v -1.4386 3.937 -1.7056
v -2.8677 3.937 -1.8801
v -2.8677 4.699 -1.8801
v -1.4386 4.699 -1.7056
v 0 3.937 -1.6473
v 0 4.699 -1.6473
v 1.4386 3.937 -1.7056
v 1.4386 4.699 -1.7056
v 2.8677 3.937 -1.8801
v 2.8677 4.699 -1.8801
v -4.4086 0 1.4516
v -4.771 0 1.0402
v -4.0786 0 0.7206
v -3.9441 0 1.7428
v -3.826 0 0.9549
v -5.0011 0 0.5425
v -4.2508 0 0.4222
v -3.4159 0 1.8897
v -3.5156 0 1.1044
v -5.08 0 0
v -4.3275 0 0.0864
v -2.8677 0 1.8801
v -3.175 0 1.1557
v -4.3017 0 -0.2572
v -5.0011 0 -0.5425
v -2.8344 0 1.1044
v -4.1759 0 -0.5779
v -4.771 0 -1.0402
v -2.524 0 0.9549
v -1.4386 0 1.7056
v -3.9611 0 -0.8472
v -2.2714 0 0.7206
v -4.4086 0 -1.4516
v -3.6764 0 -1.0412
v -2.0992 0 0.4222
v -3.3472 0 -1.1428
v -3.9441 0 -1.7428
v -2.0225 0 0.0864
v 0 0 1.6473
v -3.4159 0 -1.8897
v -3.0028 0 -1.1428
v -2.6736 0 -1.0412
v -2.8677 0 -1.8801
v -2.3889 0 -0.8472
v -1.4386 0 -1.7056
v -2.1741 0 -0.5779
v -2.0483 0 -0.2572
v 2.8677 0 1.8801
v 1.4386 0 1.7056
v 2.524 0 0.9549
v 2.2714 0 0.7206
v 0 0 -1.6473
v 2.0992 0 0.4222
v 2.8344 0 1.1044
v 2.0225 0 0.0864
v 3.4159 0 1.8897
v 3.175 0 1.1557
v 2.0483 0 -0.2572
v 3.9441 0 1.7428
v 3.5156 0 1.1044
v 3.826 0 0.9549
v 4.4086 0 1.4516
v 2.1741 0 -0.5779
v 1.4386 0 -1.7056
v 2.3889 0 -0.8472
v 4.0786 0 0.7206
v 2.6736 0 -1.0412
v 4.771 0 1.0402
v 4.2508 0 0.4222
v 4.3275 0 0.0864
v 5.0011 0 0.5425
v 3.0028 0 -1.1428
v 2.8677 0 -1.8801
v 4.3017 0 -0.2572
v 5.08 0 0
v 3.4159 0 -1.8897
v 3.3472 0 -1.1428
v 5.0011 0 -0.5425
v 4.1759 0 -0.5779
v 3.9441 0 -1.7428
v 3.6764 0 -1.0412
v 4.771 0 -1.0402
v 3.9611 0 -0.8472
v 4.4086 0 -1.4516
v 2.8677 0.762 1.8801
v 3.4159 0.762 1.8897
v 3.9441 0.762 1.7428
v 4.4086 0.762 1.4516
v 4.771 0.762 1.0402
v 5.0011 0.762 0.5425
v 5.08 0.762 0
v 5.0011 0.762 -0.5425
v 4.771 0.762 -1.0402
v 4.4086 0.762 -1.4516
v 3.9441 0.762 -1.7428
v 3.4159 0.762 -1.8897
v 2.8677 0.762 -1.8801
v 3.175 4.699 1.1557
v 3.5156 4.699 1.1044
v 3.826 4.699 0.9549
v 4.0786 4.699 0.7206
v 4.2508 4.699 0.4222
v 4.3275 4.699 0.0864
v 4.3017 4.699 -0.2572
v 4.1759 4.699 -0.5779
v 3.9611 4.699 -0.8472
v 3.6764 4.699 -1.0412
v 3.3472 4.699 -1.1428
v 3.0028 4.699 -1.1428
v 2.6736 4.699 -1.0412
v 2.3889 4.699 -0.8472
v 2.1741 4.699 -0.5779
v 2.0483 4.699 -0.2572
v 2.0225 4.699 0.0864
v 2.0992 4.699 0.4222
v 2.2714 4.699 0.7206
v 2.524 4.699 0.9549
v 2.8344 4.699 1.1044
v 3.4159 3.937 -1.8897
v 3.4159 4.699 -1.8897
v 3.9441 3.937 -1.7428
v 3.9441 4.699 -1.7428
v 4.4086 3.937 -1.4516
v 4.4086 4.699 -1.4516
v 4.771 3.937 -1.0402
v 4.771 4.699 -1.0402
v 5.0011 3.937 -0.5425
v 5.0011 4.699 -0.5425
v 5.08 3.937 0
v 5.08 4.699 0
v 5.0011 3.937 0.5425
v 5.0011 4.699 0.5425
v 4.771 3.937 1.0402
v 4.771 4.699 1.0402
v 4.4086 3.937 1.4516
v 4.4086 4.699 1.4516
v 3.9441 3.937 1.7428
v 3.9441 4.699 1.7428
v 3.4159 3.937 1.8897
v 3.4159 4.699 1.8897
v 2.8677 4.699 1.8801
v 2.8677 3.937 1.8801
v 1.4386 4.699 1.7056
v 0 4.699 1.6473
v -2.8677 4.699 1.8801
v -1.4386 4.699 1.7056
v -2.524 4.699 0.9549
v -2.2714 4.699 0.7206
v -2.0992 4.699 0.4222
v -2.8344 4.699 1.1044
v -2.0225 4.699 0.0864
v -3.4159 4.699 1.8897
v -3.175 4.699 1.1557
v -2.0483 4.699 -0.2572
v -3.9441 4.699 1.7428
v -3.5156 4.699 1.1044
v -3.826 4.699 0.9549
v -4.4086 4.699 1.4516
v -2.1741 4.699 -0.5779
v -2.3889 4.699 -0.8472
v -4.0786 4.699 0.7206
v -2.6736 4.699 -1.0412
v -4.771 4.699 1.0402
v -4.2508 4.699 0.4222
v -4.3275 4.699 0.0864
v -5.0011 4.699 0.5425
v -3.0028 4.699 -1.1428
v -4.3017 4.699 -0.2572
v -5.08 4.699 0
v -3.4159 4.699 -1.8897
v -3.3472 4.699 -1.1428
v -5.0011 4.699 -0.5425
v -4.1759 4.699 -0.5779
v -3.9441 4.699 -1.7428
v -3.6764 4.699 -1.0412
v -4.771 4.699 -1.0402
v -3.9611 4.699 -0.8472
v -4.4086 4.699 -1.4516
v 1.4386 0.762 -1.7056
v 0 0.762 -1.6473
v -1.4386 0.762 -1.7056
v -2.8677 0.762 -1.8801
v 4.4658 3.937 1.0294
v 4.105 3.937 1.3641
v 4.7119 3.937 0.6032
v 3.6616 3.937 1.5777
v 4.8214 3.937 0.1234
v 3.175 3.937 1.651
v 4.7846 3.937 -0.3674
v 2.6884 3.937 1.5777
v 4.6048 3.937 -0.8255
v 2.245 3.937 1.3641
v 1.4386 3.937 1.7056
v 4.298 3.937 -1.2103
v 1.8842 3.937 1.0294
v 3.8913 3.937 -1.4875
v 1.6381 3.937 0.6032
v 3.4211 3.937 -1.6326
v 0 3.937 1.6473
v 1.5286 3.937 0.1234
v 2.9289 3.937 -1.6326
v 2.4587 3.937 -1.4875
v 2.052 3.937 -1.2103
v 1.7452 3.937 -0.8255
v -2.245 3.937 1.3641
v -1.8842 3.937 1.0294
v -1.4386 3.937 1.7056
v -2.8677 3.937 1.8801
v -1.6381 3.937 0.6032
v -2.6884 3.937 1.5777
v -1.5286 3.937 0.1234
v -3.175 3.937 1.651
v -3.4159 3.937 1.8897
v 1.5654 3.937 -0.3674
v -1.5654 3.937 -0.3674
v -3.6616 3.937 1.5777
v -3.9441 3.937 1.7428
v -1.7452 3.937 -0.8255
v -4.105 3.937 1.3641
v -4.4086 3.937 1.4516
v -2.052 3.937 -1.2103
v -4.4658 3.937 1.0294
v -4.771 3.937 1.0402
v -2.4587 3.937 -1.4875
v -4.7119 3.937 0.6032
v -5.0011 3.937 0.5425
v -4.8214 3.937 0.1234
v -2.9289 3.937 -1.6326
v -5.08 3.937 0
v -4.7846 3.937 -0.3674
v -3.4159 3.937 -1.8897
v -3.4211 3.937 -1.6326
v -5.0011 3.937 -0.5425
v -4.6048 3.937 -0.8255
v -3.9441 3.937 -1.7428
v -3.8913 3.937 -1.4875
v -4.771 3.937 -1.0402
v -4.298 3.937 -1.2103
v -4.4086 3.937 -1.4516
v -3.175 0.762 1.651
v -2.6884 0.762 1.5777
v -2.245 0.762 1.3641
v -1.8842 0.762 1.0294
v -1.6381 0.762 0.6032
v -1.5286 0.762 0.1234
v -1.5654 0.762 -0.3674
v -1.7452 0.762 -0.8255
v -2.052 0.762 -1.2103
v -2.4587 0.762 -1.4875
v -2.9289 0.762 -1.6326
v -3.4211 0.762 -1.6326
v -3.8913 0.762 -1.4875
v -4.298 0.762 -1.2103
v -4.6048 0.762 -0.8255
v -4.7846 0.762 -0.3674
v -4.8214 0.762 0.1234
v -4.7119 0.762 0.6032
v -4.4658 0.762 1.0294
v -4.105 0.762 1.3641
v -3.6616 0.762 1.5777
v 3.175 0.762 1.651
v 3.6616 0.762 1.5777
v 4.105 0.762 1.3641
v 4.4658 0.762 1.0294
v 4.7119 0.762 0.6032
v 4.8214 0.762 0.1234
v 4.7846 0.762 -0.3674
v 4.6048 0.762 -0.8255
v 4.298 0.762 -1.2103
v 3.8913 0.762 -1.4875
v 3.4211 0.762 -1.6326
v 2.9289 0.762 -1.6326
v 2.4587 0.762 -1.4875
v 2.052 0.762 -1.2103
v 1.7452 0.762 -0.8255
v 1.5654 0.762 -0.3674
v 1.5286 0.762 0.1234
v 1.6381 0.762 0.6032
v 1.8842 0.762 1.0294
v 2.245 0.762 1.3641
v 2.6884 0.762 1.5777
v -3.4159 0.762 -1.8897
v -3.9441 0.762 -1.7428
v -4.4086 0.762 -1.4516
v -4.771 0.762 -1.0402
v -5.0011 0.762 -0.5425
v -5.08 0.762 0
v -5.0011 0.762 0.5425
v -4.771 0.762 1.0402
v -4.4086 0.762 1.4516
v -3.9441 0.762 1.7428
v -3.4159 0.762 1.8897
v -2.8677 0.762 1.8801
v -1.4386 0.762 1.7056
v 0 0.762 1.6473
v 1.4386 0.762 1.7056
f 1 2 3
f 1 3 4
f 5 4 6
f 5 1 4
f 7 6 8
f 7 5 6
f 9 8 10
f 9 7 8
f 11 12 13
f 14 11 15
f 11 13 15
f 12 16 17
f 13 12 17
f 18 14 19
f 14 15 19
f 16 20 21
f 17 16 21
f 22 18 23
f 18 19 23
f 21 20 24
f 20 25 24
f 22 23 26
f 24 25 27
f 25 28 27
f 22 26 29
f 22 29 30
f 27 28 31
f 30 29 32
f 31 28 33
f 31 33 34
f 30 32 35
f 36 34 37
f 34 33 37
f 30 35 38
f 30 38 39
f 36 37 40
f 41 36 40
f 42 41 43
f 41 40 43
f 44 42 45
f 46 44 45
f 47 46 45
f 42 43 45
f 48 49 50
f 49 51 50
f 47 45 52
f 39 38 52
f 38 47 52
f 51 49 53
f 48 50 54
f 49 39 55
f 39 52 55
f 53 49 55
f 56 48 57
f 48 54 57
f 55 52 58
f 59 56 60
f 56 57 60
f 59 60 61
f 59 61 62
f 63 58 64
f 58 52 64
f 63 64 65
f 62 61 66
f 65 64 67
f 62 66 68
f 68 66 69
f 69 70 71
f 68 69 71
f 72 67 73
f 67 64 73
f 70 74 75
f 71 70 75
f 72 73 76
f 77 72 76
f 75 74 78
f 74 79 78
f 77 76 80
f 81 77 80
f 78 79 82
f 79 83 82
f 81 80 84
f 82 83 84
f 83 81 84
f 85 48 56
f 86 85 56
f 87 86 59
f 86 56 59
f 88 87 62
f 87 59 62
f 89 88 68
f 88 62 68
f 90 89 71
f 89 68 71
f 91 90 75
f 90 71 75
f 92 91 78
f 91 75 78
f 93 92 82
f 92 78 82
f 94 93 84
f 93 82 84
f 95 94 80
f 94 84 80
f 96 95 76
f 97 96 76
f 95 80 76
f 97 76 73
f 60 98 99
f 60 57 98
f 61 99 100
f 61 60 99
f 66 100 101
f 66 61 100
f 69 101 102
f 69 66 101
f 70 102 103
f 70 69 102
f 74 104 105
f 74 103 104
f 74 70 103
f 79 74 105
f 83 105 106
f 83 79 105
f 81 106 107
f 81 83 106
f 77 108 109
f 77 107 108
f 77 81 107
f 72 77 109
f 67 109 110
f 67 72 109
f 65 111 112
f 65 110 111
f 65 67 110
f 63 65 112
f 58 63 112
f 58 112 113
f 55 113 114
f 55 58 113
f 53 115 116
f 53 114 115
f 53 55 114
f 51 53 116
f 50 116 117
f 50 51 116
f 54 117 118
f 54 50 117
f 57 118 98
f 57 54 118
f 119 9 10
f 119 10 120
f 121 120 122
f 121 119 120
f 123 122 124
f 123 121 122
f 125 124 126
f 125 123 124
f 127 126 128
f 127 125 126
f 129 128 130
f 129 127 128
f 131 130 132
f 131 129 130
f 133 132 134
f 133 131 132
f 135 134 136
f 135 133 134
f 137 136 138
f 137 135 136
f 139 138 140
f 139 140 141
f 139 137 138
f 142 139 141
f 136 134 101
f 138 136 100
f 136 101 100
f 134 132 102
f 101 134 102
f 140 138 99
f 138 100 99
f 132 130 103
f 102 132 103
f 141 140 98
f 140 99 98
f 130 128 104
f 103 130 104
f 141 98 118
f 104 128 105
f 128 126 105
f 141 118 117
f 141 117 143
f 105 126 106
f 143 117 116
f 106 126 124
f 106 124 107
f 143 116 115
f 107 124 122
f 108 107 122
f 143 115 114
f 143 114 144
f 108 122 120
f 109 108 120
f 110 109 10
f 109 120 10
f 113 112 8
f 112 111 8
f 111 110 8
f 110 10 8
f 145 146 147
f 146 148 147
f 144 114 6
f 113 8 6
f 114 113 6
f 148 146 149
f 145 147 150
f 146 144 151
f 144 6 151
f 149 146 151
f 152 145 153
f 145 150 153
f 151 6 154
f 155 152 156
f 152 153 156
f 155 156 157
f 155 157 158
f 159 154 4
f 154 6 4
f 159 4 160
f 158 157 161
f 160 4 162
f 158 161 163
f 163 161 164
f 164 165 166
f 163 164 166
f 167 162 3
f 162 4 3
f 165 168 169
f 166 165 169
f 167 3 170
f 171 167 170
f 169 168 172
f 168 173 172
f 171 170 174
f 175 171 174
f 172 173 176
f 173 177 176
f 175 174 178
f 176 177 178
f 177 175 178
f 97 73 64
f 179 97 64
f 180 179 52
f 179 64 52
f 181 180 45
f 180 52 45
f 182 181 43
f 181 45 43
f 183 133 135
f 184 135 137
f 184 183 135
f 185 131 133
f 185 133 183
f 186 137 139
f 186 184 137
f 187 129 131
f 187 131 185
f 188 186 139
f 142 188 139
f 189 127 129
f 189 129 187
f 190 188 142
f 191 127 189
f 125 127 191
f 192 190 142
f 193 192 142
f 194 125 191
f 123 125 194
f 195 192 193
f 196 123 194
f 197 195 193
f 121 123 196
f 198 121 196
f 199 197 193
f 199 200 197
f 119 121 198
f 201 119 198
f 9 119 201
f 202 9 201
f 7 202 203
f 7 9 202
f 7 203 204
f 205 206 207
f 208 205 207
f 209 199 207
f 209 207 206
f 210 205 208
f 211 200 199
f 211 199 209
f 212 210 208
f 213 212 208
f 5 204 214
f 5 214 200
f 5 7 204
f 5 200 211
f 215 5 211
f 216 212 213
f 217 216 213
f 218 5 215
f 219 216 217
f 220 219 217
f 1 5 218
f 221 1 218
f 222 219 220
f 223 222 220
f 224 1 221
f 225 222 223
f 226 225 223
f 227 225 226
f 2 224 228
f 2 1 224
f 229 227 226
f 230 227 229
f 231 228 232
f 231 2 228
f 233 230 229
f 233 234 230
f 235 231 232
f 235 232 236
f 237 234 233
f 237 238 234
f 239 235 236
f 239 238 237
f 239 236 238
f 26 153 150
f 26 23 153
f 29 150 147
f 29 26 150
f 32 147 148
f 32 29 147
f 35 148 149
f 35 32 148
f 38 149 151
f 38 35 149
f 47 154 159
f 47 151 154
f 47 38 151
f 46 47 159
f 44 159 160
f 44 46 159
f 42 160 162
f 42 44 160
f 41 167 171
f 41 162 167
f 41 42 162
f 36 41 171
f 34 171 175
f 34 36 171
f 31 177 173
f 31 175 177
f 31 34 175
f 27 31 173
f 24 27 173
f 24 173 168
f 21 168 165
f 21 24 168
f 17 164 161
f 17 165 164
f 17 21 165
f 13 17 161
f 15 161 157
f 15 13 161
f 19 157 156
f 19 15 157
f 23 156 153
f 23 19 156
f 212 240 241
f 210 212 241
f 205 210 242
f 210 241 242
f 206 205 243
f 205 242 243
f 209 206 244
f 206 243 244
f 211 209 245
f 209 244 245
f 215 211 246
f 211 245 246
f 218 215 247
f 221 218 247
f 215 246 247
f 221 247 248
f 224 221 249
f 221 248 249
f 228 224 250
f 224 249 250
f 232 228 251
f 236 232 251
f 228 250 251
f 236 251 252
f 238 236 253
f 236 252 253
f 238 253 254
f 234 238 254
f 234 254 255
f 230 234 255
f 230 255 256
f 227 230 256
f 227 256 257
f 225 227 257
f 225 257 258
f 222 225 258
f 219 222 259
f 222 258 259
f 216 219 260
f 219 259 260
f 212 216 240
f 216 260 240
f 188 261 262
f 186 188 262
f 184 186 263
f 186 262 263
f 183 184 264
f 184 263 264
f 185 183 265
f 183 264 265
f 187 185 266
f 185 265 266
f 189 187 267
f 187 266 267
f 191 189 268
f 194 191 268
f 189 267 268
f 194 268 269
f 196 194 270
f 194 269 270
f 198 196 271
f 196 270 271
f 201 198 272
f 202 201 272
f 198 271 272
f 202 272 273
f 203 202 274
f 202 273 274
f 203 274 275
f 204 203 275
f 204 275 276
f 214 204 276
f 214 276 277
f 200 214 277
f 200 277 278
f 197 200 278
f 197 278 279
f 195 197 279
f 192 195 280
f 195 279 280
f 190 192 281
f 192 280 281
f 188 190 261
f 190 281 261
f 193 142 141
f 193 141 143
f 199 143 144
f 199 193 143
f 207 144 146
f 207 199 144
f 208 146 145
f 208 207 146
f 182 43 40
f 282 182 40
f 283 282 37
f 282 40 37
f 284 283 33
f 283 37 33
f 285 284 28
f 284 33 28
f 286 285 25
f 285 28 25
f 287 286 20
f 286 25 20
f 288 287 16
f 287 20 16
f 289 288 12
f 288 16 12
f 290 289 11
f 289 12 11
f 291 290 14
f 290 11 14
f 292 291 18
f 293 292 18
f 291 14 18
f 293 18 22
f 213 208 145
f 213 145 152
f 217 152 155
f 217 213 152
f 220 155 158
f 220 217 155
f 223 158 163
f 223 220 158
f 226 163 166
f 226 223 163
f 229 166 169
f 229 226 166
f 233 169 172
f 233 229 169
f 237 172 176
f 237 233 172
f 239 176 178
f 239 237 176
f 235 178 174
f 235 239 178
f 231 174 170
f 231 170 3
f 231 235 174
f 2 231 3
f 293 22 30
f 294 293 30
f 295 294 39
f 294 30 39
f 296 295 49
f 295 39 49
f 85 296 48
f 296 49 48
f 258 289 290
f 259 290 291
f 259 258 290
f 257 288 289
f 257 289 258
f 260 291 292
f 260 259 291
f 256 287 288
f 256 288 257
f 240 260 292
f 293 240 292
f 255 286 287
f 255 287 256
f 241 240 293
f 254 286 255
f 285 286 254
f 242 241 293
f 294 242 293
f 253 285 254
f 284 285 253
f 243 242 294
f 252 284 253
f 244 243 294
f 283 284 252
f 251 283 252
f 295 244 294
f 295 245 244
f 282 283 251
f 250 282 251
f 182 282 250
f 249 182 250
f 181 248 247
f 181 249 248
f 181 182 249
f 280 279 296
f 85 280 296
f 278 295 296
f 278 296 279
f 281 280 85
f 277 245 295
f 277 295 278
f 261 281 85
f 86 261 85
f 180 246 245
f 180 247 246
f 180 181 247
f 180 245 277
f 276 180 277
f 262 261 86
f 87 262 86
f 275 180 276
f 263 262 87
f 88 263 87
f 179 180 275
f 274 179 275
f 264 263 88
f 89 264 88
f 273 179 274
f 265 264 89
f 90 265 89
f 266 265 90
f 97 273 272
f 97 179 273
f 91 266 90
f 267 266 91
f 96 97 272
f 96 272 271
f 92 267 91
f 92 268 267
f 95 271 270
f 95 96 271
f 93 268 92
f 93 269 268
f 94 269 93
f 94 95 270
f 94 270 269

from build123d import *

# Parameters (mm, degrees)
BOSS_EXTRUDE1_DEPTH     = 0.762
SKETCH3_R               = 1.651
SKETCH3_R_2             = 1.1557
BOSS_EXTRUDE2_DEPTH     = 3.175
BOSS_EXTRUDE3_DEPTH     = 0.762
CUT_EXTRUDE1_DEPTH      = 7.703386756
CUT_EXTRUDE1_DEPTH_BACK = 7.703386756
SKETCH5_R               = 1.1557


with BuildPart() as part:
    # Sketch2 → Boss-Extrude1 (new body)
    with BuildSketch(Plane(origin=(0, 0, 0), x_dir=(1, 0, 0), z_dir=(0, 1, 0))):
        with BuildLine():
            ThreePointArc((2.867741935, -1.88005784), (5.08, 0), (2.867741935, 1.88005784))
            ThreePointArc((2.867741935, 1.88005784), (0, 1.647264347), (-2.867741935, 1.88005784))
            ThreePointArc((-2.867741935, 1.88005784), (-5.08, 0), (-2.867741935, -1.88005784))
            ThreePointArc((-2.867741935, -1.88005784), (0, -1.647264347), (2.867741935, -1.88005784))
        make_face()
    extrude(amount=BOSS_EXTRUDE1_DEPTH)

    # Sketch3 → Boss-Extrude2 (add)
    # profile 1 of 2: a face of its own
    with BuildSketch(Plane(origin=(0, 0.762, 0), x_dir=(1, 0, 0), z_dir=(0, 1, 0))):
        with Locations(Location((-3.175, 0, 0), (0, 0, 270))):
            Circle(SKETCH3_R)
        with Locations(Location((-3.175, 0, 0), (0, 0, 270))):
            Circle(SKETCH3_R_2, mode=Mode.SUBTRACT)
    # profile 2 of 2: a face of its own
    with BuildSketch(Plane(origin=(0, 0.762, 0), x_dir=(1, 0, 0), z_dir=(0, 1, 0))):
        with Locations(Location((3.175, 0, 0), (0, 0, 270))):
            Circle(SKETCH3_R)
        with Locations(Location((3.175, 0, 0), (0, 0, 270))):
            Circle(SKETCH3_R_2, mode=Mode.SUBTRACT)
    extrude(amount=BOSS_EXTRUDE2_DEPTH)

    # Sketch4 → Boss-Extrude3 (add)
    with BuildSketch(Plane(origin=(0, 3.937, 0), x_dir=(1, 0, 0), z_dir=(0, 1, 0))):
        with BuildLine():
            ThreePointArc((2.867741935, -1.88005784), (0, -1.647264347), (-2.867741935, -1.88005784))
            ThreePointArc((-2.867741935, -1.88005784), (-5.08, 0), (-2.867741935, 1.88005784))
            ThreePointArc((-2.867741935, 1.88005784), (0, 1.647264347), (2.867741935, 1.88005784))
            ThreePointArc((2.867741935, 1.88005784), (5.08, 0), (2.867741935, -1.88005784))
        make_face()
    extrude(amount=BOSS_EXTRUDE3_DEPTH)

    # Sketch5 → Cut-Extrude1 (cut, two sides: drawn at the far end of the back side and taken through both)
    with BuildSketch(Plane(origin=(0, 0.762, 0), x_dir=(1, 0, 0), z_dir=(0, 1, 0)).offset(-CUT_EXTRUDE1_DEPTH_BACK)):
        with Locations(Location((3.175, 0, 0), (0, 0, 270))):
            Circle(SKETCH5_R)
        with Locations(Location((-3.175, 0, 0), (0, 0, 270))):
            Circle(SKETCH5_R)
    extrude(amount=CUT_EXTRUDE1_DEPTH + CUT_EXTRUDE1_DEPTH_BACK, mode=Mode.SUBTRACT)


solid = part.part
